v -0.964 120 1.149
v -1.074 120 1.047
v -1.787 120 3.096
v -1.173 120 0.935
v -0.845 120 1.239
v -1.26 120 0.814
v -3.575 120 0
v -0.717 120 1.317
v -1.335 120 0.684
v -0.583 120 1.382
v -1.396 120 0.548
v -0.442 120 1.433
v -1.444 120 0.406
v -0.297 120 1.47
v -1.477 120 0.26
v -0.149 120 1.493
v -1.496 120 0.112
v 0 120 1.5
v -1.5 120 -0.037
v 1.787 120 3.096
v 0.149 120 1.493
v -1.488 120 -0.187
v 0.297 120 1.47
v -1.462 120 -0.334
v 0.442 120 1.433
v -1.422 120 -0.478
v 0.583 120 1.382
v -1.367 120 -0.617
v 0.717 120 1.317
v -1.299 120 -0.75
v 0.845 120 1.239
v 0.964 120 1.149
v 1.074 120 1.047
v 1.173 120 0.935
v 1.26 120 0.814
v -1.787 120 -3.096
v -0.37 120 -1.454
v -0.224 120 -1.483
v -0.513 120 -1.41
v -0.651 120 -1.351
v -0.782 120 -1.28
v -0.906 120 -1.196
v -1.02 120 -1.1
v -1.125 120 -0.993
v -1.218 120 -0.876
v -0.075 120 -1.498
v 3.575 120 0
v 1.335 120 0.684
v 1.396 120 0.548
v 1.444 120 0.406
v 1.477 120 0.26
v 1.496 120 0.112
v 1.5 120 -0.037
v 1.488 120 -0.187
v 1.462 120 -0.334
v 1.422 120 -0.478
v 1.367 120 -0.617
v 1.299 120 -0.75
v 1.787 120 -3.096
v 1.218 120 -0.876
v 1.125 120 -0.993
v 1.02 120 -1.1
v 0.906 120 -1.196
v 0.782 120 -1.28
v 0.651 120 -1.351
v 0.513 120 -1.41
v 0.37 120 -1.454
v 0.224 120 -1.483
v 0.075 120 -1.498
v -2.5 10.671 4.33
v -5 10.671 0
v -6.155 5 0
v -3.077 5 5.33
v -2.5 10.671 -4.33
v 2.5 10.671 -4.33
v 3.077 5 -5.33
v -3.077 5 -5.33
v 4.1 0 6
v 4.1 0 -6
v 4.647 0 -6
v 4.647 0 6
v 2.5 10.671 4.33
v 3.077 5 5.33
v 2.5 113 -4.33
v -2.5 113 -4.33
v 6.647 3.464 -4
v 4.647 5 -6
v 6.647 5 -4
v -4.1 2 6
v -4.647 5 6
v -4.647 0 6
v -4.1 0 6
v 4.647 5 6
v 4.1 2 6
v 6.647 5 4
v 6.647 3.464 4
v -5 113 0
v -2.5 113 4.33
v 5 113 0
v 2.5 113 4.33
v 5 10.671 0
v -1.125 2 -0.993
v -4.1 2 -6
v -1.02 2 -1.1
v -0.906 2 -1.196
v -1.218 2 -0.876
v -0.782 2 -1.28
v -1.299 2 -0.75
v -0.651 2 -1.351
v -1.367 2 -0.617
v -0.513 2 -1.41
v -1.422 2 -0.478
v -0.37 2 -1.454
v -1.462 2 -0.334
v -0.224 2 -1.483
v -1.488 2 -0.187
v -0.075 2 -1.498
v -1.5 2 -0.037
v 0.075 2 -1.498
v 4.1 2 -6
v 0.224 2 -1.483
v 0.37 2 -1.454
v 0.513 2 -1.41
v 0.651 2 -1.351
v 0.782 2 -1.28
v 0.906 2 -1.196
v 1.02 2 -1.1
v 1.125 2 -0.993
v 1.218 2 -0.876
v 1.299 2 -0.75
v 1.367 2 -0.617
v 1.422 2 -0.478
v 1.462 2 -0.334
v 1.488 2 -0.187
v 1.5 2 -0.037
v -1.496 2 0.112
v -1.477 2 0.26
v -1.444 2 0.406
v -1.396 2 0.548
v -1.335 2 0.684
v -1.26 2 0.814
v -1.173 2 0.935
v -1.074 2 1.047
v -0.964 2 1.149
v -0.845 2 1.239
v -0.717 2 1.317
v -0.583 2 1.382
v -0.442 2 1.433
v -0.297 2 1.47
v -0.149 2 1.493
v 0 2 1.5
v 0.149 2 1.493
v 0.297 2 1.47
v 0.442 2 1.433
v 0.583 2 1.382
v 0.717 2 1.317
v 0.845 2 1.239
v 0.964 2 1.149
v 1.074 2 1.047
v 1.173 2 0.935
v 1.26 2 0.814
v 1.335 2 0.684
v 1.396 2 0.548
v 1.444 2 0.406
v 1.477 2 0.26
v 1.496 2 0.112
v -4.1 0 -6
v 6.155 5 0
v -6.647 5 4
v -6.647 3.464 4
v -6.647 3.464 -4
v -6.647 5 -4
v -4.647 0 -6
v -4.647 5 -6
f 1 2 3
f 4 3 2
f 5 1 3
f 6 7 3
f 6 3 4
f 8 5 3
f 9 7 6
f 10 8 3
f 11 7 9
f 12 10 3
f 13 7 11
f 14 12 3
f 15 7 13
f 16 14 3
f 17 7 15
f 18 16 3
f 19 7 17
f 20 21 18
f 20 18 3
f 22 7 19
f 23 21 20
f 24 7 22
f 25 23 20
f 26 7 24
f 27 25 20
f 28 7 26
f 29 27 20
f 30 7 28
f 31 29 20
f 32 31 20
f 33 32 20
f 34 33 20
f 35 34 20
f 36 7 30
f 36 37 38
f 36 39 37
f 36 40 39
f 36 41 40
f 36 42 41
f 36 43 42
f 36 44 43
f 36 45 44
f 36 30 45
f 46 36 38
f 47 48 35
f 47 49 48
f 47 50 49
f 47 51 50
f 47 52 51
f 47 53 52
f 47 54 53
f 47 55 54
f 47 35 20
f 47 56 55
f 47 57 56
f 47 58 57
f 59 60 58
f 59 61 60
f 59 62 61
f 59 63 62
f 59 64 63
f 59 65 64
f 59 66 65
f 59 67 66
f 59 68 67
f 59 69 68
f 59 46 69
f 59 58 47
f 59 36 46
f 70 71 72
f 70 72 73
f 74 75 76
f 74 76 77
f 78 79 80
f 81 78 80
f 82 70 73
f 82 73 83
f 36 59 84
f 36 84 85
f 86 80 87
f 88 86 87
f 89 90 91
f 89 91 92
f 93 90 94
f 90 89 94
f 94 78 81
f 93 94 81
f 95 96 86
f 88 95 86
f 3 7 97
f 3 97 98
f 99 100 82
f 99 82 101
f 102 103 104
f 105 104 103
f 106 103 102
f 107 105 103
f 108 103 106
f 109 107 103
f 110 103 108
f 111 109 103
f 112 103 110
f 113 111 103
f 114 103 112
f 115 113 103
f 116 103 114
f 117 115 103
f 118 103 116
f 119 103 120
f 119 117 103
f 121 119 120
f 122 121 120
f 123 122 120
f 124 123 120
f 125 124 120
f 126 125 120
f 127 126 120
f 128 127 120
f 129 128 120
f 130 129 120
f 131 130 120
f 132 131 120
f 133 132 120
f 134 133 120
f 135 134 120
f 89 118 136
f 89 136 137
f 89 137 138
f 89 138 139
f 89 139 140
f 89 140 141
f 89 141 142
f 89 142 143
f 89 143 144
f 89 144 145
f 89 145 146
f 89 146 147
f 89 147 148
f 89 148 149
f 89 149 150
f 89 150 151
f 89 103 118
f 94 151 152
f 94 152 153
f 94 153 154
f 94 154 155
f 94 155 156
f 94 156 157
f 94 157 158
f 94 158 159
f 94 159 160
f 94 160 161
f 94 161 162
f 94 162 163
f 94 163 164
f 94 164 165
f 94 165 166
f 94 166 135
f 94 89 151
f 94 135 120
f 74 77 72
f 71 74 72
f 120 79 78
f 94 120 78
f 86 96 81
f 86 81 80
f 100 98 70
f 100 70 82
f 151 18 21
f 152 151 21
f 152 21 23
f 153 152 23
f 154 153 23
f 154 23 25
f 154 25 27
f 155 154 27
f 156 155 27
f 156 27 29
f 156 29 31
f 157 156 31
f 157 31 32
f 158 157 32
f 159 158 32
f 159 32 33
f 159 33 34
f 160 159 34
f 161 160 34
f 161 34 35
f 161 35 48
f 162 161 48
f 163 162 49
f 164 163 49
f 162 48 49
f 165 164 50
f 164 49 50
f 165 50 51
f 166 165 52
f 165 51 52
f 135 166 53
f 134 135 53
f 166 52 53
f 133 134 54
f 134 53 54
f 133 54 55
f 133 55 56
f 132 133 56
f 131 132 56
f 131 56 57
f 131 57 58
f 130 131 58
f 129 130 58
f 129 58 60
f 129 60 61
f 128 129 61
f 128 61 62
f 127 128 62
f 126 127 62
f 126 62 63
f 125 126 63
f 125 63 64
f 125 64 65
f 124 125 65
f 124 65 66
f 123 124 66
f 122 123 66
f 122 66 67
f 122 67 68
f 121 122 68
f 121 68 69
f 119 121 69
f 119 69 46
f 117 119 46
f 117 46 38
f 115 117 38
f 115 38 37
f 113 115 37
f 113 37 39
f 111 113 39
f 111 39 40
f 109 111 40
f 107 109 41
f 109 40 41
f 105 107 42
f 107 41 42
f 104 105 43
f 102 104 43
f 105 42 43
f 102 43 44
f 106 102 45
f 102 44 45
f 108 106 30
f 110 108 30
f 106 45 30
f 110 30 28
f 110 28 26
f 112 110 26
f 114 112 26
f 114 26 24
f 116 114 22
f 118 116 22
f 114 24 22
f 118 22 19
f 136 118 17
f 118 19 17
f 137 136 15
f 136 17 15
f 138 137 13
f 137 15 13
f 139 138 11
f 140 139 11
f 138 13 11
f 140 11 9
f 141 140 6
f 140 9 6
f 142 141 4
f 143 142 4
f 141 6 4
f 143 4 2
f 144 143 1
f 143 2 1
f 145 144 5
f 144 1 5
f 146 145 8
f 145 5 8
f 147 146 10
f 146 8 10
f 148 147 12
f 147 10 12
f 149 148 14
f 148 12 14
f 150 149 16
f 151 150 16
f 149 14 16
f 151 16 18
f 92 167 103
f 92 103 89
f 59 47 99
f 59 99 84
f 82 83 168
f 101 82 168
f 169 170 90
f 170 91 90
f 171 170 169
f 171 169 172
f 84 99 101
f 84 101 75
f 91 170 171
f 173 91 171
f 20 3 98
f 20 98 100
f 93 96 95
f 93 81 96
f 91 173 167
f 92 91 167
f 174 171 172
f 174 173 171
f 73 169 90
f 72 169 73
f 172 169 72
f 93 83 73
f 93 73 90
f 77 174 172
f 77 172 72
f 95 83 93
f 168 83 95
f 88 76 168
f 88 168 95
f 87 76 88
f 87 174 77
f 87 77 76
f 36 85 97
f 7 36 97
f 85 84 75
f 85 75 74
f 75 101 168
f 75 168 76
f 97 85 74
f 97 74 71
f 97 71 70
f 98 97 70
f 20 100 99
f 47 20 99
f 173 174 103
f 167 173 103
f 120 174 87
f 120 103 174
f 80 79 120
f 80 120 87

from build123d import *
from OCP.BRepFilletAPI import BRepFilletAPI_MakeChamfer

# Parameters (mm, degrees)
SKETCH1_W           = 13.29305136
SKETCH1_H           = 12
BOSS_EXTRUDE1_DEPTH = 120
SKETCH2_W           = 8.2
SKETCH2_H           = 54.027992046
CUT_EXTRUDE1_DEPTH  = 2
SKETCH3_R           = 1.5
CUT_EXTRUDE2_DEPTH  = 140
SKETCH4_OUTSIDE_W   = 39.56
SKETCH4_OUTSIDE_H   = 38.266
CUT_EXTRUDE3_DEPTH  = 115
CHAMFER1_SIZE       = 1
CHAMFER1_SIZE2      = 5.67128182
CHAMFER2_SIZE       = 2
CHAMFER3_SIZE       = 7
CHAMFER3_SIZE2      = 1.234288865
CHAMFER4_SIZE       = 2
CHAMFER4_SIZE2      = 3.464101615


with BuildPart() as part:
    # Sketch1 → Boss-Extrude1 (new body)
    with BuildSketch(Plane(origin=(0, 0, 0), x_dir=(1, 0, 0), z_dir=(0, 1, 0))):
        Rectangle(SKETCH1_W, SKETCH1_H)
    extrude(amount=BOSS_EXTRUDE1_DEPTH)

    # Sketch2 → Cut-Extrude1 (cut)
    with BuildSketch(Plane.XZ):
        Rectangle(SKETCH2_W, SKETCH2_H)
    extrude(amount=-CUT_EXTRUDE1_DEPTH, mode=Mode.SUBTRACT)

    # Sketch3 → Cut-Extrude2 (cut)
    with BuildSketch(Plane(origin=(0, 120, 0), x_dir=(1, 0, 0), z_dir=(0, 1, 0))):
        with Locations(Location((0, 0, 0), (0, 0, 270))):
            Circle(SKETCH3_R)
    extrude(amount=-CUT_EXTRUDE2_DEPTH, mode=Mode.SUBTRACT)

    # Sketch4 outside → Cut-Extrude3 (cut)
    with BuildSketch(Plane(origin=(0, 120, 0), x_dir=(1, 0, 0), z_dir=(0, 1, 0))):
        Rectangle(SKETCH4_OUTSIDE_W, SKETCH4_OUTSIDE_H)
        Polygon((-2.5, -4.330127019), (2.5, -4.330127019), (5, 0), (2.5, 4.330127019), (-2.5, 4.330127019), (-5, 0), align=None, mode=Mode.SUBTRACT)
    extrude(amount=-CUT_EXTRUDE3_DEPTH, mode=Mode.SUBTRACT)

    # Chamfer1
    chamfer1_edges = [part.edges().sort_by_distance(p)[0] for p in [
        (0, 5, 4.330127019),
        (3.75, 5, 2.165063509),
        (3.75, 5, -2.165063509),
        (0, 5, -4.330127019),
        (-3.75, 5, -2.165063509),
        (-3.75, 5, 2.165063509),
    ]]
    chamfer1_side = [part.faces().sort_by_distance(p)[0] for p in [
        (-6.467443237, 5, 0),
    ]]
    chamfer(chamfer1_edges, length=CHAMFER1_SIZE, length2=CHAMFER1_SIZE2, reference=chamfer1_side[0])

    # Chamfer2
    chamfer2_edges = [part.edges().sort_by_distance(p)[0] for p in [
        (6.64652568, 2.5, 6),
        (-6.64652568, 2.5, 6),
        (-6.64652568, 2.5, -6),
        (6.64652568, 2.5, -6),
    ]]
    chamfer(chamfer2_edges, length=CHAMFER2_SIZE)

    # Chamfer3: one chamfer whose edges measure the first distance from different faces: ONE call of the kernel's chamfer builder (chamfer() names one face for all edges)
    chamfer3_edges_1 = [part.edges().sort_by_distance(p)[0] for p in [
        (3.75, 120, 2.165063509),
    ]]
    chamfer3_side_1 = [part.faces().sort_by_distance(p)[0] for p in [
        (3.75, 65.33564091, 2.165063509),
    ]]
    chamfer3_edges_2 = [part.edges().sort_by_distance(p)[0] for p in [
        (0, 120, 4.330127019),
    ]]
    chamfer3_side_2 = [part.faces().sort_by_distance(p)[0] for p in [
        (0, 65.33564091, 4.330127019),
    ]]
    chamfer3_edges_3 = [part.edges().sort_by_distance(p)[0] for p in [
        (-3.75, 120, 2.165063509),
    ]]
    chamfer3_side_3 = [part.faces().sort_by_distance(p)[0] for p in [
        (-3.75, 65.33564091, 2.165063509),
    ]]
    chamfer3_edges_4 = [part.edges().sort_by_distance(p)[0] for p in [
        (-3.75, 120, -2.165063509),
    ]]
    chamfer3_side_4 = [part.faces().sort_by_distance(p)[0] for p in [
        (-3.75, 65.33564091, -2.165063509),
    ]]
    chamfer3_edges_5 = [part.edges().sort_by_distance(p)[0] for p in [
        (0, 120, -4.330127019),
    ]]
    chamfer3_side_5 = [part.faces().sort_by_distance(p)[0] for p in [
        (0, 65.33564091, -4.330127019),
    ]]
    chamfer3_edges_6 = [part.edges().sort_by_distance(p)[0] for p in [
        (3.75, 120, -2.165063509),
    ]]
    chamfer3_side_6 = [part.faces().sort_by_distance(p)[0] for p in [
        (3.75, 65.33564091, -2.165063509),
    ]]
    chamfer3 = BRepFilletAPI_MakeChamfer(part.part.solid().wrapped)
    for e in chamfer3_edges_1:
        chamfer3.Add(CHAMFER3_SIZE, CHAMFER3_SIZE2, e.wrapped, chamfer3_side_1[0].wrapped)  # the first distance lies on this face
    for e in chamfer3_edges_2:
        chamfer3.Add(CHAMFER3_SIZE, CHAMFER3_SIZE2, e.wrapped, chamfer3_side_2[0].wrapped)  # the first distance lies on this face
    for e in chamfer3_edges_3:
        chamfer3.Add(CHAMFER3_SIZE, CHAMFER3_SIZE2, e.wrapped, chamfer3_side_3[0].wrapped)  # the first distance lies on this face
    for e in chamfer3_edges_4:
        chamfer3.Add(CHAMFER3_SIZE, CHAMFER3_SIZE2, e.wrapped, chamfer3_side_4[0].wrapped)  # the first distance lies on this face
    for e in chamfer3_edges_5:
        chamfer3.Add(CHAMFER3_SIZE, CHAMFER3_SIZE2, e.wrapped, chamfer3_side_5[0].wrapped)  # the first distance lies on this face
    for e in chamfer3_edges_6:
        chamfer3.Add(CHAMFER3_SIZE, CHAMFER3_SIZE2, e.wrapped, chamfer3_side_6[0].wrapped)  # the first distance lies on this face
    add(Compound.cast(chamfer3.Shape()), mode=Mode.REPLACE)

    # Chamfer4: one chamfer whose edges measure the first distance from different faces: ONE call of the kernel's chamfer builder (chamfer() names one face for all edges)
    chamfer4_edges_1 = [part.edges().sort_by_distance(p)[0] for p in [
        (-6.64652568, 0, 0),
    ]]
    chamfer4_side_1 = [part.faces().sort_by_distance(p)[0] for p in [
        (-5.281902175, 0, 0),
    ]]
    chamfer4_edges_2 = [part.edges().sort_by_distance(p)[0] for p in [
        (6.64652568, 0, 0),
    ]]
    chamfer4_side_2 = [part.faces().sort_by_distance(p)[0] for p in [
        (5.281902175, 0, 0),
    ]]
    chamfer4 = BRepFilletAPI_MakeChamfer(part.part.solid().wrapped)
    for e in chamfer4_edges_1:
        chamfer4.Add(CHAMFER4_SIZE, CHAMFER4_SIZE2, e.wrapped, chamfer4_side_1[0].wrapped)  # the first distance lies on this face
    for e in chamfer4_edges_2:
        chamfer4.Add(CHAMFER4_SIZE, CHAMFER4_SIZE2, e.wrapped, chamfer4_side_2[0].wrapped)  # the first distance lies on this face
    add(Compound.cast(chamfer4.Shape()), mode=Mode.REPLACE)


solid = part.part
